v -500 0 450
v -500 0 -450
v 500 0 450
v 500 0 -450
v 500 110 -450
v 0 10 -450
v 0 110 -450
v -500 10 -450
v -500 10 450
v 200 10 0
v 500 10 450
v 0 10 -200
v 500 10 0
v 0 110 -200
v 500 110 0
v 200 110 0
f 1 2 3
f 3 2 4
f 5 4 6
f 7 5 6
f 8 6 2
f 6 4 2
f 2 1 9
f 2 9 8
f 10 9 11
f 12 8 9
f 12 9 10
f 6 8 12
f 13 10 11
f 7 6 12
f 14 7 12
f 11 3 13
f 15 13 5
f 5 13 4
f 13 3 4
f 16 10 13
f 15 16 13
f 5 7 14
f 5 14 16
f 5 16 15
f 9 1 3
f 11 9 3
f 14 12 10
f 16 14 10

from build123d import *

# Parameters (mm, degrees)
SKETCH1_W           = 1000
SKETCH1_H           = 900
BOSS_EXTRUDE1_DEPTH = 10
BOSS_EXTRUDE2_DEPTH = 100


with BuildPart() as part:
    # Sketch1 → Boss-Extrude1 (new body)
    with BuildSketch(Plane(origin=(0, 0, 0), x_dir=(1, 0, 0), z_dir=(0, 1, 0))):
        Rectangle(SKETCH1_W, SKETCH1_H)
    extrude(amount=BOSS_EXTRUDE1_DEPTH)

    # Sketch2 → Boss-Extrude2 (add)
    with BuildSketch(Plane(origin=(0, 10, 0), x_dir=(1, 0, 0), z_dir=(0, 1, 0))):
        Polygon((0, 450), (0, 200), (200, 0), (500, 0), (500, 450), align=None)
    extrude(amount=BOSS_EXTRUDE2_DEPTH)


solid = part.part
